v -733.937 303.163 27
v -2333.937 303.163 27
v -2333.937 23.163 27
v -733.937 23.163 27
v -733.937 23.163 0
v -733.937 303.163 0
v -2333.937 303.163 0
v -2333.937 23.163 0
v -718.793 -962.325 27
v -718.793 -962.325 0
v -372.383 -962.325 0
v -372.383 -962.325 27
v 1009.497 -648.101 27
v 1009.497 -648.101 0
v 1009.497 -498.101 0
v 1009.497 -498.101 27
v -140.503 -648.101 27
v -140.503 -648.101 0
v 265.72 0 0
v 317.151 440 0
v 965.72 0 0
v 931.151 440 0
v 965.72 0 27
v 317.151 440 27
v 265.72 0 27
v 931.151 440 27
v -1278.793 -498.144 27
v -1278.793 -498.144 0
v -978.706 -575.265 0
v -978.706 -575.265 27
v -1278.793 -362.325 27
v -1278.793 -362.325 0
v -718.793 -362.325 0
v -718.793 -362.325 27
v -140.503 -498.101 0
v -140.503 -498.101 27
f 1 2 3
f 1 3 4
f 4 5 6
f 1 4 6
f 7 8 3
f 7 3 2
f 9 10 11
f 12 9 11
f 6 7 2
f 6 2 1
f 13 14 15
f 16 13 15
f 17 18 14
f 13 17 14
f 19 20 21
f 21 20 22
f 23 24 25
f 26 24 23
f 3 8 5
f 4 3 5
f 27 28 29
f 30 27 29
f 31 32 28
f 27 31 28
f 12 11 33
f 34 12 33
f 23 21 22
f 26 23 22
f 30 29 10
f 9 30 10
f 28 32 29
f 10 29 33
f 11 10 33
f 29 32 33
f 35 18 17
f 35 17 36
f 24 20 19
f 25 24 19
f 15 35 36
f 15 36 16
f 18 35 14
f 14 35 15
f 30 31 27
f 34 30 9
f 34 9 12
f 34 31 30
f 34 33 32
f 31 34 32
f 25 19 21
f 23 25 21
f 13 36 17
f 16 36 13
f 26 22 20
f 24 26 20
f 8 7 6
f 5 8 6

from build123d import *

# Parameters (mm, degrees)
F1_W     = 1600
F1_H     = 280
F2_DEPTH = 27
F3_W     = 1150
F3_H     = 150
F4_DEPTH = 27
F6_DEPTH = 27
F8_DEPTH = 27


with BuildPart() as f2:
    # F1 (on Top) → F2 (new body)
    with BuildSketch(Plane.XY):
        with Locations((-1533.9374229312, 163.1630075723)):
            Rectangle(F1_W, F1_H)
    extrude(amount=F2_DEPTH)


with BuildPart() as f4:
    # F3 (on Top) → F4 (new body)
    with BuildSketch(Plane.XY):
        with Locations((434.4969987869, -573.1007933617)):
            Rectangle(F3_W, F3_H)
    extrude(amount=F4_DEPTH)


with BuildPart() as f6:
    # F5 (on Top) → F6 (new body)
    with BuildSketch(Plane.XY):
        Polygon((-718.7933301926, -362.3247981071), (-1278.7933301926, -362.3247981071), (-1278.7933301926, -498.1443583965), (-978.7063193321, -575.2648115158), (-718.7933301926, -962.3247981071), align=None)
        Polygon((-372.3831686788, -962.3247981071), (-718.7933301926, -362.3247981071), (-718.7933301926, -962.3247981071), align=None)
    extrude(amount=F6_DEPTH)


with BuildPart() as f8:
    # F7 (on Top) → F8 (new body)
    with BuildSketch(Plane.XY):
        Polygon((931.1510100365, 440), (317.1510100365, 440), (265.7196223736, 0), (965.7196223736, 0), align=None)
    extrude(amount=F8_DEPTH)


solid = Compound([f2.part, f4.part, f6.part, f8.part])
